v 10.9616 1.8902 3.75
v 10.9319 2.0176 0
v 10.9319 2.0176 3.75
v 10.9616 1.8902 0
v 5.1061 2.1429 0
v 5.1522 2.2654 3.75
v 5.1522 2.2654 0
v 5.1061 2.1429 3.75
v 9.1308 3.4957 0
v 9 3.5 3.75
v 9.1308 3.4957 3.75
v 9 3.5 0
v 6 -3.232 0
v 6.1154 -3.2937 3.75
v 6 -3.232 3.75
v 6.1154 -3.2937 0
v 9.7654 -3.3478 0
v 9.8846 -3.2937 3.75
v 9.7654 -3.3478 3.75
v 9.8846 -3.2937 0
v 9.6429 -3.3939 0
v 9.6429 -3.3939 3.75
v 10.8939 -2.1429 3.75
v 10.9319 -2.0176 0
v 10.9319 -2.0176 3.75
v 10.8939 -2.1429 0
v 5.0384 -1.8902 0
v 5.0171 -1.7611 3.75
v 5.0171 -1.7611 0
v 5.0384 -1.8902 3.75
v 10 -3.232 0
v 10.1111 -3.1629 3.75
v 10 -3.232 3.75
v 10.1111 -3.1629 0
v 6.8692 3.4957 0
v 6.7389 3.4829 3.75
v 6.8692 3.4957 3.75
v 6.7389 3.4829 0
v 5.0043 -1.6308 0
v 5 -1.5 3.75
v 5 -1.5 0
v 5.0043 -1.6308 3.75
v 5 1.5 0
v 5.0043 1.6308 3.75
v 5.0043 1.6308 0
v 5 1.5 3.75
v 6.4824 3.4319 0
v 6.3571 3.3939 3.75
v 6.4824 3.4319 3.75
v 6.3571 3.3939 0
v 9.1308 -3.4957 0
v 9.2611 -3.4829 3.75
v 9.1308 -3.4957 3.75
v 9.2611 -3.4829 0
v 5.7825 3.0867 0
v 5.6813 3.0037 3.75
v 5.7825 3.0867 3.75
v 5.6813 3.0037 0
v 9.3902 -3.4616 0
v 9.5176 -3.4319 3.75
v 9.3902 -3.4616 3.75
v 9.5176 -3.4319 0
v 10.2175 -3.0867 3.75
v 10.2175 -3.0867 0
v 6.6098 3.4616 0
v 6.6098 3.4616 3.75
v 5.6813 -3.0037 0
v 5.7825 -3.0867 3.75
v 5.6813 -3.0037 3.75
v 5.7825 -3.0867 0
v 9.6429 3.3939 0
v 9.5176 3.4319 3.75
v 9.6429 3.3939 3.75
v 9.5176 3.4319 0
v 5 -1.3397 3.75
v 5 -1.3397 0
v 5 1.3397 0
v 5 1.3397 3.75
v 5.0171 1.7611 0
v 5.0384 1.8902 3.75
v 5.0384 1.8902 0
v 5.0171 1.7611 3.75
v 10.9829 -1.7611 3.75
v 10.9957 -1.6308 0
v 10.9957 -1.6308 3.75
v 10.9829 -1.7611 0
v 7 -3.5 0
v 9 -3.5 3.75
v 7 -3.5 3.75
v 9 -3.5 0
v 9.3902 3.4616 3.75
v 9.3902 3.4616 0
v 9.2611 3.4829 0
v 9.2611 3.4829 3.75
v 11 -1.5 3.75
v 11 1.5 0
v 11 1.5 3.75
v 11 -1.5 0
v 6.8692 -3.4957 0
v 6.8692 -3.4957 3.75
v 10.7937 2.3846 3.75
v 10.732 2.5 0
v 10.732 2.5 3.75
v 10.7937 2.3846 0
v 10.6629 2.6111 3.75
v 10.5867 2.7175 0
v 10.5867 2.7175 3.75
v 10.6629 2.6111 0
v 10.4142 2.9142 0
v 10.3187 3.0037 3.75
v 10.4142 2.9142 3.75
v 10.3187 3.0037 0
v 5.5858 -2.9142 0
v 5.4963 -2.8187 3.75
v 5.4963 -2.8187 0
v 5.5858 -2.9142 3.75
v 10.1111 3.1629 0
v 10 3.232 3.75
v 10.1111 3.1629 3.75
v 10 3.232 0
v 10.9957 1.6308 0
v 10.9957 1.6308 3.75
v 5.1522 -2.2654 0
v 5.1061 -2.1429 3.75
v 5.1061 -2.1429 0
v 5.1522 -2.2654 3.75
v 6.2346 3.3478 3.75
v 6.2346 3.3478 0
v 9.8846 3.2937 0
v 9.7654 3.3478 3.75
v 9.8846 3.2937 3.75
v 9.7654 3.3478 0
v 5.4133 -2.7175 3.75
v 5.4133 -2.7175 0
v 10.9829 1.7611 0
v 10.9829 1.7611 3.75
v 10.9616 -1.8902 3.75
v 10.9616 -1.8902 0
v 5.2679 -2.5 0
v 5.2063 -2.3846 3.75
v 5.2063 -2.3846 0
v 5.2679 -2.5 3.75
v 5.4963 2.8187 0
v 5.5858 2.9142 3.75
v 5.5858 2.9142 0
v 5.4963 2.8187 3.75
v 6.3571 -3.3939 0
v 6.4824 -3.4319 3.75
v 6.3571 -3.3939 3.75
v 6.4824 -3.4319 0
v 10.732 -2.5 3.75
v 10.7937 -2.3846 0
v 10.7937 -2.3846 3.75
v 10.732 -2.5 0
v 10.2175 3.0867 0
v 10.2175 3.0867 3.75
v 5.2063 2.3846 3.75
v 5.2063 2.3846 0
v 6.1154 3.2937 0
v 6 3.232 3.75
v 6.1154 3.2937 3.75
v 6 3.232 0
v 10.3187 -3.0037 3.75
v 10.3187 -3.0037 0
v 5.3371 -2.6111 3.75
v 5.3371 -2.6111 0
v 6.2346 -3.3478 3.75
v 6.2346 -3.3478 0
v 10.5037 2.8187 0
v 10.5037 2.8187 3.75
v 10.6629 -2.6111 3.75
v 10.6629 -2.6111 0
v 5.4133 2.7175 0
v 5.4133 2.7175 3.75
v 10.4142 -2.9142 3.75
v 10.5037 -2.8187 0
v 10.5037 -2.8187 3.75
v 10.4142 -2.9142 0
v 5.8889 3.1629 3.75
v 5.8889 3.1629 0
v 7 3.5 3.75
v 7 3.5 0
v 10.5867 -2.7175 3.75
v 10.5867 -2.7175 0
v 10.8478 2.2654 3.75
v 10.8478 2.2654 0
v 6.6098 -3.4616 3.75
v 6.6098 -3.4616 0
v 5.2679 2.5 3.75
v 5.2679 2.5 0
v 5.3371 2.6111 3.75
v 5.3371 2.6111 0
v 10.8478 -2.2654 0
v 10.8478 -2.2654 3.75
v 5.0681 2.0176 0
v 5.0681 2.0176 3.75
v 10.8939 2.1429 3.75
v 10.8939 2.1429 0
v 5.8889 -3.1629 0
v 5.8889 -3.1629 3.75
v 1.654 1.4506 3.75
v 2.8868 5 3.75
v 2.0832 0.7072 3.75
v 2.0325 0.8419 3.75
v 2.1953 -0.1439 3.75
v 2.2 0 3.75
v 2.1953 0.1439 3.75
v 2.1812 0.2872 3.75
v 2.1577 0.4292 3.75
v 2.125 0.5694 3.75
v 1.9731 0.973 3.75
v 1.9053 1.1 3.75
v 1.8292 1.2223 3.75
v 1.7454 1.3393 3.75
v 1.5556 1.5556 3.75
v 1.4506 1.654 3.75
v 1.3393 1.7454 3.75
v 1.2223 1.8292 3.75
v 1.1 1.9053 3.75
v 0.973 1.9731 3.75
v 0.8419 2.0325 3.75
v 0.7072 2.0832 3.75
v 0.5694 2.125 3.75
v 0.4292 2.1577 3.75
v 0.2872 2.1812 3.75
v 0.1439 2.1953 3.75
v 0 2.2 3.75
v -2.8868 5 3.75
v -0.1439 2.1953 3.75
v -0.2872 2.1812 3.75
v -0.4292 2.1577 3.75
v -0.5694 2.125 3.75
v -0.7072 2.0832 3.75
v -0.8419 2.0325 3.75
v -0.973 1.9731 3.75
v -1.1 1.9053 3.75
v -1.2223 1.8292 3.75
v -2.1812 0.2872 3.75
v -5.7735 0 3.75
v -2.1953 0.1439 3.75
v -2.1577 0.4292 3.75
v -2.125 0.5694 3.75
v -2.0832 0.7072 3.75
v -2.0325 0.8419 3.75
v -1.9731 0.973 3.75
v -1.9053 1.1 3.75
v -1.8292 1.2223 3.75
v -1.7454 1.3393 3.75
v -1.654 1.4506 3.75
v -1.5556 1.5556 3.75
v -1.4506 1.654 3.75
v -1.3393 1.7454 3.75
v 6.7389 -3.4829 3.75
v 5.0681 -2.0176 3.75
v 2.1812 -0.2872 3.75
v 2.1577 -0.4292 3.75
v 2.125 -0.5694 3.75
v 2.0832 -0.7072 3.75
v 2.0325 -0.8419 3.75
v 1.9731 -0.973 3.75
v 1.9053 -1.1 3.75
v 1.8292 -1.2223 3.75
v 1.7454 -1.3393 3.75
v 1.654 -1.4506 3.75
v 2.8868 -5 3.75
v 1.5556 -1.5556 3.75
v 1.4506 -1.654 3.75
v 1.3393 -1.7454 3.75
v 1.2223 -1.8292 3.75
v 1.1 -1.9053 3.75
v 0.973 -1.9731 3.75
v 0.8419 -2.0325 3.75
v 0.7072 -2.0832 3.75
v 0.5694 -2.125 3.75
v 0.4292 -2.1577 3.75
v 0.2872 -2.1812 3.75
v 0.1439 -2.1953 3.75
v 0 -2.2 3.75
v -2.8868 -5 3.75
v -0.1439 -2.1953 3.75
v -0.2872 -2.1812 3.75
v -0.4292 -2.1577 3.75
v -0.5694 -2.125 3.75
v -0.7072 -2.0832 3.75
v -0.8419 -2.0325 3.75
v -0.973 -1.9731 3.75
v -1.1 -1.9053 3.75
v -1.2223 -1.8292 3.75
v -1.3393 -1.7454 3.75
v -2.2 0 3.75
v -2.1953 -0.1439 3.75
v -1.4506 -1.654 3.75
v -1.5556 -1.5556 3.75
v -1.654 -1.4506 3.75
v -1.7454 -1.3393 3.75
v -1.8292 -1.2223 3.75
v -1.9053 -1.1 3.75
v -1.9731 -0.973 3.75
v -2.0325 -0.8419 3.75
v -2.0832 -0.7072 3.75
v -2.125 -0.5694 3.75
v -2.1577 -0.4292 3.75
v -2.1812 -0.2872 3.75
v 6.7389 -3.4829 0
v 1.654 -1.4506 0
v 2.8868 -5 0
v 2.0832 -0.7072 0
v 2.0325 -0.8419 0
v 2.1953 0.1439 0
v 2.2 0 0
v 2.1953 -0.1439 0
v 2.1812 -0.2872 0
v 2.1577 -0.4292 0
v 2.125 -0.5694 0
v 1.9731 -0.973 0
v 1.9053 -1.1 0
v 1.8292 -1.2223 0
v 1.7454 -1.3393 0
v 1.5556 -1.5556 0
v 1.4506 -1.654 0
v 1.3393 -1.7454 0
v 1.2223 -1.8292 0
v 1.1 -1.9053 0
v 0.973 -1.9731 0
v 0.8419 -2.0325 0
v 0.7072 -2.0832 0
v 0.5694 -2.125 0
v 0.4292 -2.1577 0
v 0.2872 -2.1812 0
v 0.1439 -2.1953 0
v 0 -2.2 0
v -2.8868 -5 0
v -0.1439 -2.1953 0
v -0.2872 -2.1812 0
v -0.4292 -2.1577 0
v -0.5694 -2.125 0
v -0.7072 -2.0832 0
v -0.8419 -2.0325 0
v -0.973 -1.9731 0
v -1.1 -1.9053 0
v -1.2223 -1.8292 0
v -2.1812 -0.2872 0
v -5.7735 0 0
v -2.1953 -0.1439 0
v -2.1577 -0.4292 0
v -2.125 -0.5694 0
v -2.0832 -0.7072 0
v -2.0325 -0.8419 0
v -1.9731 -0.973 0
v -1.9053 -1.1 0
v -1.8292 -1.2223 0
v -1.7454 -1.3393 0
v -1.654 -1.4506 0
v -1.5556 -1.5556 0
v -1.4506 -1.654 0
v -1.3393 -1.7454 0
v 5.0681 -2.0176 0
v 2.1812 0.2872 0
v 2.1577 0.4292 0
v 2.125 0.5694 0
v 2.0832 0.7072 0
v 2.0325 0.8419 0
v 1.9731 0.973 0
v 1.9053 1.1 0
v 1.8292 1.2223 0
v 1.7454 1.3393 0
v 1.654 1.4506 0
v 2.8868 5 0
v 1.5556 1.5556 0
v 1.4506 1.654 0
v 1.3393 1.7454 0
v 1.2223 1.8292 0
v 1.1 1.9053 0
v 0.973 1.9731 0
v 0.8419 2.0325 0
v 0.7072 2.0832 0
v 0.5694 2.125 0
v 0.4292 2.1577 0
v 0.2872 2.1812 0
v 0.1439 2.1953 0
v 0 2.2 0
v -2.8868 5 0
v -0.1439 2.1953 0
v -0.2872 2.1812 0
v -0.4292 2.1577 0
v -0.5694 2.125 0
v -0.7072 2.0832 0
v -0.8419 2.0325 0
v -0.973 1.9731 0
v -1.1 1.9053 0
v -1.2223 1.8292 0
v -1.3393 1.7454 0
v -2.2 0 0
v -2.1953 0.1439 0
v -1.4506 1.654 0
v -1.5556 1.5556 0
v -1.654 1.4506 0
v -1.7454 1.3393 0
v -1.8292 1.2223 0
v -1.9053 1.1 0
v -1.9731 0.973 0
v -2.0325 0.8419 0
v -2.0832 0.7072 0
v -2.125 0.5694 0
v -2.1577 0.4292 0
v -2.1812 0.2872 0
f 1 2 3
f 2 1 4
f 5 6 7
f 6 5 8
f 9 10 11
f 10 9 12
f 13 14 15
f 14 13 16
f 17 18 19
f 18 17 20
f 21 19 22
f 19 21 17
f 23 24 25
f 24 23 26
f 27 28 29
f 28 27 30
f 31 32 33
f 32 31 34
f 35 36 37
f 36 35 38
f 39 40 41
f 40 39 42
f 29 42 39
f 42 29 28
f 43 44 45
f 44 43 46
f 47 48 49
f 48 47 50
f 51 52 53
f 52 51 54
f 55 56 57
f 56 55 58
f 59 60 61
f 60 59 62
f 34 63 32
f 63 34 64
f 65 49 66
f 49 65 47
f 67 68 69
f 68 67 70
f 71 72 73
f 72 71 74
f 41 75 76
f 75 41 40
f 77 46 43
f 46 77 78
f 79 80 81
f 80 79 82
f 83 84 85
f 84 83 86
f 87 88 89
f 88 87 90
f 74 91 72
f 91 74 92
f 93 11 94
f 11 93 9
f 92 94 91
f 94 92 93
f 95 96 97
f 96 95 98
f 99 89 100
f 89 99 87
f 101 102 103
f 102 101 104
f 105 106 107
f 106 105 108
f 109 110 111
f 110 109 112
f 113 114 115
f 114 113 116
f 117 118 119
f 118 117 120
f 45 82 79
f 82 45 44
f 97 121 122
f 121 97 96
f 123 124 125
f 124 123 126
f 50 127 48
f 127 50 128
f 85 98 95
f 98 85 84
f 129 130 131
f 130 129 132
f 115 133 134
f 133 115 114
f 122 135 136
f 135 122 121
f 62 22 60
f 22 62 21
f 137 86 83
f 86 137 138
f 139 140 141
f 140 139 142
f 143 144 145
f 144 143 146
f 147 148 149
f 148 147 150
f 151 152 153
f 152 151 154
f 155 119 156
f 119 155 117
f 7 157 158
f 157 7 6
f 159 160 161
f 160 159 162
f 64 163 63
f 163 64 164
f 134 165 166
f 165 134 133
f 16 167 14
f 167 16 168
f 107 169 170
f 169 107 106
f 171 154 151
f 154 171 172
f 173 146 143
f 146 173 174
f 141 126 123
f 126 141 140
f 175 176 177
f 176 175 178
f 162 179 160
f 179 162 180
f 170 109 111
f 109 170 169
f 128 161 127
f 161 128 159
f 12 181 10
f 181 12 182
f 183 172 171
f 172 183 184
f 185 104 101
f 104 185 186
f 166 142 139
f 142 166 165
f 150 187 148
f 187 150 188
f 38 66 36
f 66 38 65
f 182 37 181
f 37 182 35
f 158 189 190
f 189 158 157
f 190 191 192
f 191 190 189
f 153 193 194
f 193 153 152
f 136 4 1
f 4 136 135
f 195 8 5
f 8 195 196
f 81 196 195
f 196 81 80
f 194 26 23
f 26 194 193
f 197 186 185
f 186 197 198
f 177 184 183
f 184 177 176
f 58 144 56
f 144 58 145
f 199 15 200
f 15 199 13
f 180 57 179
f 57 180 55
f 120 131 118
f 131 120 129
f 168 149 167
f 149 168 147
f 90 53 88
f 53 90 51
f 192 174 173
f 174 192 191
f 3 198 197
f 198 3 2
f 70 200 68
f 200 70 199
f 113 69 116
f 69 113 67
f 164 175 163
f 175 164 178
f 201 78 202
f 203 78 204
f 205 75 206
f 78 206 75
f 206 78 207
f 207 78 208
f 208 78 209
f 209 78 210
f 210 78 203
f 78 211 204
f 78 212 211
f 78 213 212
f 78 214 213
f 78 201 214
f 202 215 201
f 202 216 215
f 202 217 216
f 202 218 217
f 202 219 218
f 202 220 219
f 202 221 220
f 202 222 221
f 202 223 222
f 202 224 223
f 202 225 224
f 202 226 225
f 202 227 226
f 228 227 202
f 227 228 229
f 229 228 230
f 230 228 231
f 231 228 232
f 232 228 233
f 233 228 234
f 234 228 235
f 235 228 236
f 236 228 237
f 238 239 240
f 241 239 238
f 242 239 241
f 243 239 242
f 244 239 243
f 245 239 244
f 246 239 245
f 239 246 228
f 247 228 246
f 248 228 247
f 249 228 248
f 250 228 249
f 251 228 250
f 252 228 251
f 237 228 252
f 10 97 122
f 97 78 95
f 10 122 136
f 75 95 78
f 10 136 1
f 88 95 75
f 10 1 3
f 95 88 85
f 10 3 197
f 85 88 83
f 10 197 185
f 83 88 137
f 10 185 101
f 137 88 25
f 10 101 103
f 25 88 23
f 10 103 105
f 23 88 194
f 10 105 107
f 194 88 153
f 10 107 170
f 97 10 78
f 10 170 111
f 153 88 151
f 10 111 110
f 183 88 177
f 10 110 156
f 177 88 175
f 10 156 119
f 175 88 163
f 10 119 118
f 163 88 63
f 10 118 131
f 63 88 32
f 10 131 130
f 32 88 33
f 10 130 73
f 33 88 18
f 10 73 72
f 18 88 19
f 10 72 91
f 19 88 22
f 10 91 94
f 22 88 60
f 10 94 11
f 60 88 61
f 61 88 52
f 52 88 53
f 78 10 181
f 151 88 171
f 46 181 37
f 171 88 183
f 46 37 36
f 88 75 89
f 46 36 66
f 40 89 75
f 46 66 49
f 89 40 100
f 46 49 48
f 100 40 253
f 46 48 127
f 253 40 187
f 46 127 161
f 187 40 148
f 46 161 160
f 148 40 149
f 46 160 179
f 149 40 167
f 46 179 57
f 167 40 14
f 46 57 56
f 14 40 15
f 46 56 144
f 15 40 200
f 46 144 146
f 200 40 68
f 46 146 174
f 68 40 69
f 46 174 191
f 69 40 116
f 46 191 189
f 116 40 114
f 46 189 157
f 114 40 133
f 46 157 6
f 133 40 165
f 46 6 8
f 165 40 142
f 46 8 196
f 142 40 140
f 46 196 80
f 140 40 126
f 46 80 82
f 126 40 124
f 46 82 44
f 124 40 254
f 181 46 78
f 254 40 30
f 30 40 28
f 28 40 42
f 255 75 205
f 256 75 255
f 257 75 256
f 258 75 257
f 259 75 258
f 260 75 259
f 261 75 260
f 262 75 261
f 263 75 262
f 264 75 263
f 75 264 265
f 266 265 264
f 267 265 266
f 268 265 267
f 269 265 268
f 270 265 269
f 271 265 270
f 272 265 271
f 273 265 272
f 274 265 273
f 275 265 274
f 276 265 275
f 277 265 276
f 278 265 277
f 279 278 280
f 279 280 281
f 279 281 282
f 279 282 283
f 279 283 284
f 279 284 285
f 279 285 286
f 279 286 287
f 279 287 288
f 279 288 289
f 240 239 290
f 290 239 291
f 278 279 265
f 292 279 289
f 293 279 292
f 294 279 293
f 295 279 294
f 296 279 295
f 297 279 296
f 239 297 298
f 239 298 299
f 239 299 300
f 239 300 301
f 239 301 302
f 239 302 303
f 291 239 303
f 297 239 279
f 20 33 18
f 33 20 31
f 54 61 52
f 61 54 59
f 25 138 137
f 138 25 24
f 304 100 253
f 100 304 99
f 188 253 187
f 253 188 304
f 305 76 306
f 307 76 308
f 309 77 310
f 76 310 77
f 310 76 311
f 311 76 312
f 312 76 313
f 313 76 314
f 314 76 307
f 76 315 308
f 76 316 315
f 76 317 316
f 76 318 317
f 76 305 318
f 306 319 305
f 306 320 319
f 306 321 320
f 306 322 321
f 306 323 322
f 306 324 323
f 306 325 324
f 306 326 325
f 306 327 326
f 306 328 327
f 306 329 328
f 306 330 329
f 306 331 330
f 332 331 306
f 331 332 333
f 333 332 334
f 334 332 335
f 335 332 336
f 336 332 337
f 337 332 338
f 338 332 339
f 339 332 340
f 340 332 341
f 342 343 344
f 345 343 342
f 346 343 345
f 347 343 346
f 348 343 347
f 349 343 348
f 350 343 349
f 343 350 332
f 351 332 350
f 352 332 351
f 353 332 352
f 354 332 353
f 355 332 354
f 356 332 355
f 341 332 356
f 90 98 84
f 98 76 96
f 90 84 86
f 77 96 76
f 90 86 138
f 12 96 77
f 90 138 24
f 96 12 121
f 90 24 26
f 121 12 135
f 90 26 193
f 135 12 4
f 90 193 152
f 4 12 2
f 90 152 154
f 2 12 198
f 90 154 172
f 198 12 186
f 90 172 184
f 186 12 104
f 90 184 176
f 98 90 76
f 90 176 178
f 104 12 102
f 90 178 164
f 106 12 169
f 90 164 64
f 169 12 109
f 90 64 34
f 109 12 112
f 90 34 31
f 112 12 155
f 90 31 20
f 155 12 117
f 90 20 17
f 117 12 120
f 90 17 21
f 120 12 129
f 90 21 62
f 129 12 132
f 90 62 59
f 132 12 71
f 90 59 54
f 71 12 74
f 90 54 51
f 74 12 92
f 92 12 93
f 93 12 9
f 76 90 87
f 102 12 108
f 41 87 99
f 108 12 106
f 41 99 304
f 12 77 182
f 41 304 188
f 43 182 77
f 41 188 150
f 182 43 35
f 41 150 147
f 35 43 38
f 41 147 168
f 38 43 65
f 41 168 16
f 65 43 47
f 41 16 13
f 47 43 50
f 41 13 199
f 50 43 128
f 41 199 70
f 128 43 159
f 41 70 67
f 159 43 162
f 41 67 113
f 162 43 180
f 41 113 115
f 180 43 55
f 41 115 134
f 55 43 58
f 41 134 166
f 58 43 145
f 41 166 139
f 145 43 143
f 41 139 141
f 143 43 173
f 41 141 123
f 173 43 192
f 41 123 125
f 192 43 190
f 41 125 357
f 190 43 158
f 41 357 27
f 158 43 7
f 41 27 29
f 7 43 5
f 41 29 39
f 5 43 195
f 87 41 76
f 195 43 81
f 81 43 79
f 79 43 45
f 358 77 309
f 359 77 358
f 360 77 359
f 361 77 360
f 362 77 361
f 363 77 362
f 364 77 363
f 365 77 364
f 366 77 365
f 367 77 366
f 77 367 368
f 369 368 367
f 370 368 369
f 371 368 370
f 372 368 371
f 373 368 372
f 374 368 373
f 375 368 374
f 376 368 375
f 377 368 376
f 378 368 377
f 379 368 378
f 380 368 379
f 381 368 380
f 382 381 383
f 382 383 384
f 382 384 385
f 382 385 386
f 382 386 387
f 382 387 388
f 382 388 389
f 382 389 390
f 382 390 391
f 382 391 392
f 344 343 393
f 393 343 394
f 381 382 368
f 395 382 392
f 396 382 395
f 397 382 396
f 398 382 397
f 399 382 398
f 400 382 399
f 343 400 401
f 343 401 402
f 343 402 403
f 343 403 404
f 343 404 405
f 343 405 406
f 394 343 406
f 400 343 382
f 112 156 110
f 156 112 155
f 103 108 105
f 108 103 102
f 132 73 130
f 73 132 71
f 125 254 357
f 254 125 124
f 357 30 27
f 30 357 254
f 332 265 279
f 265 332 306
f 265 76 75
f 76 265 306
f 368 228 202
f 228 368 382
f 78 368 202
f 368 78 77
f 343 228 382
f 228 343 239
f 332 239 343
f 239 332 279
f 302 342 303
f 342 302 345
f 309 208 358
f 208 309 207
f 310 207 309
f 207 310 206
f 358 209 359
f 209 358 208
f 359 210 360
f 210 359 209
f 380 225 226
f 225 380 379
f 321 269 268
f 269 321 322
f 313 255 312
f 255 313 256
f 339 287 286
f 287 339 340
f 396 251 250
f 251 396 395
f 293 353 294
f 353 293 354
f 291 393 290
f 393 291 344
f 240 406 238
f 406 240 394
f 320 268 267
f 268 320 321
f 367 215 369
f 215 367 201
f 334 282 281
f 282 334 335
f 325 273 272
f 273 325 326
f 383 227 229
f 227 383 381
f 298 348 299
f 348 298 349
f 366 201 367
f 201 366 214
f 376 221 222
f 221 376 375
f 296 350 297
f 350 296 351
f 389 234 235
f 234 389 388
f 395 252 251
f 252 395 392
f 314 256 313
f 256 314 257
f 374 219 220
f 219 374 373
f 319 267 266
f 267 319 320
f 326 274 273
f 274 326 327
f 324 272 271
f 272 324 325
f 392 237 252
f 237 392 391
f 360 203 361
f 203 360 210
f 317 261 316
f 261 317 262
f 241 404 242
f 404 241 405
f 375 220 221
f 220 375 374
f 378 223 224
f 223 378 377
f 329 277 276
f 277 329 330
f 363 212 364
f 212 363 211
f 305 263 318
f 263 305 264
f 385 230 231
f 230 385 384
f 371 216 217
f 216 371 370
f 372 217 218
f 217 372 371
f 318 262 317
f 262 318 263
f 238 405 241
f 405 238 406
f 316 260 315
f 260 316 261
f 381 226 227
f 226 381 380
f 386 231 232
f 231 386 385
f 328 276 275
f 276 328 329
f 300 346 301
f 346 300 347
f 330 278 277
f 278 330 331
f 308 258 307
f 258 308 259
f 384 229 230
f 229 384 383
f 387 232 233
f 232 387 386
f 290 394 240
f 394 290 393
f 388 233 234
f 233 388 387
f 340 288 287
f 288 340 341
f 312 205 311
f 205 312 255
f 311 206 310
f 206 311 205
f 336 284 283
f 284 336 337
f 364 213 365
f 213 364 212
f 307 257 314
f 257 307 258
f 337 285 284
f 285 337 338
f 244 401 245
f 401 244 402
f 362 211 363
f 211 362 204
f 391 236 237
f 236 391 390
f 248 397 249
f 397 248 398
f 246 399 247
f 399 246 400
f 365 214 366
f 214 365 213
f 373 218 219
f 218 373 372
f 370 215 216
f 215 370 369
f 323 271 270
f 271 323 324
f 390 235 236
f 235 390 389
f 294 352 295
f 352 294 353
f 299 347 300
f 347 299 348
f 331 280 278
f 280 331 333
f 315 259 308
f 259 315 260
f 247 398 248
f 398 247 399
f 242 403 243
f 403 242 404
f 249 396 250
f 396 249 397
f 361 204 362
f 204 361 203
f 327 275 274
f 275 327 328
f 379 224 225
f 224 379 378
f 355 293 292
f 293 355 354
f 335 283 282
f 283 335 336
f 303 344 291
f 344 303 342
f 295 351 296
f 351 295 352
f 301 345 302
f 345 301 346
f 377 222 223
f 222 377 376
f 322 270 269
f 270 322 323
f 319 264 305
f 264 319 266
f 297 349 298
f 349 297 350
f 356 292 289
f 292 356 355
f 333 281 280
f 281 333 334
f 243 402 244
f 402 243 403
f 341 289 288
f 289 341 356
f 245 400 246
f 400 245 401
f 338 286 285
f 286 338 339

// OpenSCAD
$fn = 96;

// Wing nut for M4 (4.0mm) screw
// Specs: 10.0mm across flats, 3.75mm thick

across_flats = 10.0;
thickness    = 3.75;

screw_d      = 4.0;      // nominal screw diameter
clearance    = 0.4;      // clearance for through-hole
hole_d       = screw_d + clearance;

wing_span    = 22.0;     // overall width including wings
wing_len     = (wing_span - across_flats)/2;
wing_w       = 7.0;      // wing width (front-back)
wing_tip_r   = 2.0;      // rounding at wing tips

module hex_prism(af, h){
    r = af / sqrt(3); // circumradius for given across-flats
    cylinder(h=h, r=r, $fn=6);
}

module wing2d(len, w, tip_r){
    // Rounded rectangle extending from x=0..len, centered on y=0
    hull(){
        translate([tip_r, 0]) circle(r=tip_r);
        translate([len - tip_r, 0]) circle(r=tip_r);
        translate([tip_r,  w/2 - tip_r]) circle(r=tip_r);
        translate([tip_r, -w/2 + tip_r]) circle(r=tip_r);
        translate([len - tip_r,  w/2 - tip_r]) circle(r=tip_r);
        translate([len - tip_r, -w/2 + tip_r]) circle(r=tip_r);
    }
}

difference(){
    union(){
        // Central hex body
        hex_prism(across_flats, thickness);

        // Wings (left and right)
        for (sx = [-1, 1]){
            translate([sx*(across_flats/2), 0, 0])
                linear_extrude(height=thickness)
                    mirror([sx<0 ? 1 : 0, 0, 0])
                        wing2d(wing_len, wing_w, wing_tip_r);
        }
    }

    // Through hole for M4 screw
    translate([0,0,-0.2])
        cylinder(h=thickness+0.4, d=hole_d, $fn=96);
}
